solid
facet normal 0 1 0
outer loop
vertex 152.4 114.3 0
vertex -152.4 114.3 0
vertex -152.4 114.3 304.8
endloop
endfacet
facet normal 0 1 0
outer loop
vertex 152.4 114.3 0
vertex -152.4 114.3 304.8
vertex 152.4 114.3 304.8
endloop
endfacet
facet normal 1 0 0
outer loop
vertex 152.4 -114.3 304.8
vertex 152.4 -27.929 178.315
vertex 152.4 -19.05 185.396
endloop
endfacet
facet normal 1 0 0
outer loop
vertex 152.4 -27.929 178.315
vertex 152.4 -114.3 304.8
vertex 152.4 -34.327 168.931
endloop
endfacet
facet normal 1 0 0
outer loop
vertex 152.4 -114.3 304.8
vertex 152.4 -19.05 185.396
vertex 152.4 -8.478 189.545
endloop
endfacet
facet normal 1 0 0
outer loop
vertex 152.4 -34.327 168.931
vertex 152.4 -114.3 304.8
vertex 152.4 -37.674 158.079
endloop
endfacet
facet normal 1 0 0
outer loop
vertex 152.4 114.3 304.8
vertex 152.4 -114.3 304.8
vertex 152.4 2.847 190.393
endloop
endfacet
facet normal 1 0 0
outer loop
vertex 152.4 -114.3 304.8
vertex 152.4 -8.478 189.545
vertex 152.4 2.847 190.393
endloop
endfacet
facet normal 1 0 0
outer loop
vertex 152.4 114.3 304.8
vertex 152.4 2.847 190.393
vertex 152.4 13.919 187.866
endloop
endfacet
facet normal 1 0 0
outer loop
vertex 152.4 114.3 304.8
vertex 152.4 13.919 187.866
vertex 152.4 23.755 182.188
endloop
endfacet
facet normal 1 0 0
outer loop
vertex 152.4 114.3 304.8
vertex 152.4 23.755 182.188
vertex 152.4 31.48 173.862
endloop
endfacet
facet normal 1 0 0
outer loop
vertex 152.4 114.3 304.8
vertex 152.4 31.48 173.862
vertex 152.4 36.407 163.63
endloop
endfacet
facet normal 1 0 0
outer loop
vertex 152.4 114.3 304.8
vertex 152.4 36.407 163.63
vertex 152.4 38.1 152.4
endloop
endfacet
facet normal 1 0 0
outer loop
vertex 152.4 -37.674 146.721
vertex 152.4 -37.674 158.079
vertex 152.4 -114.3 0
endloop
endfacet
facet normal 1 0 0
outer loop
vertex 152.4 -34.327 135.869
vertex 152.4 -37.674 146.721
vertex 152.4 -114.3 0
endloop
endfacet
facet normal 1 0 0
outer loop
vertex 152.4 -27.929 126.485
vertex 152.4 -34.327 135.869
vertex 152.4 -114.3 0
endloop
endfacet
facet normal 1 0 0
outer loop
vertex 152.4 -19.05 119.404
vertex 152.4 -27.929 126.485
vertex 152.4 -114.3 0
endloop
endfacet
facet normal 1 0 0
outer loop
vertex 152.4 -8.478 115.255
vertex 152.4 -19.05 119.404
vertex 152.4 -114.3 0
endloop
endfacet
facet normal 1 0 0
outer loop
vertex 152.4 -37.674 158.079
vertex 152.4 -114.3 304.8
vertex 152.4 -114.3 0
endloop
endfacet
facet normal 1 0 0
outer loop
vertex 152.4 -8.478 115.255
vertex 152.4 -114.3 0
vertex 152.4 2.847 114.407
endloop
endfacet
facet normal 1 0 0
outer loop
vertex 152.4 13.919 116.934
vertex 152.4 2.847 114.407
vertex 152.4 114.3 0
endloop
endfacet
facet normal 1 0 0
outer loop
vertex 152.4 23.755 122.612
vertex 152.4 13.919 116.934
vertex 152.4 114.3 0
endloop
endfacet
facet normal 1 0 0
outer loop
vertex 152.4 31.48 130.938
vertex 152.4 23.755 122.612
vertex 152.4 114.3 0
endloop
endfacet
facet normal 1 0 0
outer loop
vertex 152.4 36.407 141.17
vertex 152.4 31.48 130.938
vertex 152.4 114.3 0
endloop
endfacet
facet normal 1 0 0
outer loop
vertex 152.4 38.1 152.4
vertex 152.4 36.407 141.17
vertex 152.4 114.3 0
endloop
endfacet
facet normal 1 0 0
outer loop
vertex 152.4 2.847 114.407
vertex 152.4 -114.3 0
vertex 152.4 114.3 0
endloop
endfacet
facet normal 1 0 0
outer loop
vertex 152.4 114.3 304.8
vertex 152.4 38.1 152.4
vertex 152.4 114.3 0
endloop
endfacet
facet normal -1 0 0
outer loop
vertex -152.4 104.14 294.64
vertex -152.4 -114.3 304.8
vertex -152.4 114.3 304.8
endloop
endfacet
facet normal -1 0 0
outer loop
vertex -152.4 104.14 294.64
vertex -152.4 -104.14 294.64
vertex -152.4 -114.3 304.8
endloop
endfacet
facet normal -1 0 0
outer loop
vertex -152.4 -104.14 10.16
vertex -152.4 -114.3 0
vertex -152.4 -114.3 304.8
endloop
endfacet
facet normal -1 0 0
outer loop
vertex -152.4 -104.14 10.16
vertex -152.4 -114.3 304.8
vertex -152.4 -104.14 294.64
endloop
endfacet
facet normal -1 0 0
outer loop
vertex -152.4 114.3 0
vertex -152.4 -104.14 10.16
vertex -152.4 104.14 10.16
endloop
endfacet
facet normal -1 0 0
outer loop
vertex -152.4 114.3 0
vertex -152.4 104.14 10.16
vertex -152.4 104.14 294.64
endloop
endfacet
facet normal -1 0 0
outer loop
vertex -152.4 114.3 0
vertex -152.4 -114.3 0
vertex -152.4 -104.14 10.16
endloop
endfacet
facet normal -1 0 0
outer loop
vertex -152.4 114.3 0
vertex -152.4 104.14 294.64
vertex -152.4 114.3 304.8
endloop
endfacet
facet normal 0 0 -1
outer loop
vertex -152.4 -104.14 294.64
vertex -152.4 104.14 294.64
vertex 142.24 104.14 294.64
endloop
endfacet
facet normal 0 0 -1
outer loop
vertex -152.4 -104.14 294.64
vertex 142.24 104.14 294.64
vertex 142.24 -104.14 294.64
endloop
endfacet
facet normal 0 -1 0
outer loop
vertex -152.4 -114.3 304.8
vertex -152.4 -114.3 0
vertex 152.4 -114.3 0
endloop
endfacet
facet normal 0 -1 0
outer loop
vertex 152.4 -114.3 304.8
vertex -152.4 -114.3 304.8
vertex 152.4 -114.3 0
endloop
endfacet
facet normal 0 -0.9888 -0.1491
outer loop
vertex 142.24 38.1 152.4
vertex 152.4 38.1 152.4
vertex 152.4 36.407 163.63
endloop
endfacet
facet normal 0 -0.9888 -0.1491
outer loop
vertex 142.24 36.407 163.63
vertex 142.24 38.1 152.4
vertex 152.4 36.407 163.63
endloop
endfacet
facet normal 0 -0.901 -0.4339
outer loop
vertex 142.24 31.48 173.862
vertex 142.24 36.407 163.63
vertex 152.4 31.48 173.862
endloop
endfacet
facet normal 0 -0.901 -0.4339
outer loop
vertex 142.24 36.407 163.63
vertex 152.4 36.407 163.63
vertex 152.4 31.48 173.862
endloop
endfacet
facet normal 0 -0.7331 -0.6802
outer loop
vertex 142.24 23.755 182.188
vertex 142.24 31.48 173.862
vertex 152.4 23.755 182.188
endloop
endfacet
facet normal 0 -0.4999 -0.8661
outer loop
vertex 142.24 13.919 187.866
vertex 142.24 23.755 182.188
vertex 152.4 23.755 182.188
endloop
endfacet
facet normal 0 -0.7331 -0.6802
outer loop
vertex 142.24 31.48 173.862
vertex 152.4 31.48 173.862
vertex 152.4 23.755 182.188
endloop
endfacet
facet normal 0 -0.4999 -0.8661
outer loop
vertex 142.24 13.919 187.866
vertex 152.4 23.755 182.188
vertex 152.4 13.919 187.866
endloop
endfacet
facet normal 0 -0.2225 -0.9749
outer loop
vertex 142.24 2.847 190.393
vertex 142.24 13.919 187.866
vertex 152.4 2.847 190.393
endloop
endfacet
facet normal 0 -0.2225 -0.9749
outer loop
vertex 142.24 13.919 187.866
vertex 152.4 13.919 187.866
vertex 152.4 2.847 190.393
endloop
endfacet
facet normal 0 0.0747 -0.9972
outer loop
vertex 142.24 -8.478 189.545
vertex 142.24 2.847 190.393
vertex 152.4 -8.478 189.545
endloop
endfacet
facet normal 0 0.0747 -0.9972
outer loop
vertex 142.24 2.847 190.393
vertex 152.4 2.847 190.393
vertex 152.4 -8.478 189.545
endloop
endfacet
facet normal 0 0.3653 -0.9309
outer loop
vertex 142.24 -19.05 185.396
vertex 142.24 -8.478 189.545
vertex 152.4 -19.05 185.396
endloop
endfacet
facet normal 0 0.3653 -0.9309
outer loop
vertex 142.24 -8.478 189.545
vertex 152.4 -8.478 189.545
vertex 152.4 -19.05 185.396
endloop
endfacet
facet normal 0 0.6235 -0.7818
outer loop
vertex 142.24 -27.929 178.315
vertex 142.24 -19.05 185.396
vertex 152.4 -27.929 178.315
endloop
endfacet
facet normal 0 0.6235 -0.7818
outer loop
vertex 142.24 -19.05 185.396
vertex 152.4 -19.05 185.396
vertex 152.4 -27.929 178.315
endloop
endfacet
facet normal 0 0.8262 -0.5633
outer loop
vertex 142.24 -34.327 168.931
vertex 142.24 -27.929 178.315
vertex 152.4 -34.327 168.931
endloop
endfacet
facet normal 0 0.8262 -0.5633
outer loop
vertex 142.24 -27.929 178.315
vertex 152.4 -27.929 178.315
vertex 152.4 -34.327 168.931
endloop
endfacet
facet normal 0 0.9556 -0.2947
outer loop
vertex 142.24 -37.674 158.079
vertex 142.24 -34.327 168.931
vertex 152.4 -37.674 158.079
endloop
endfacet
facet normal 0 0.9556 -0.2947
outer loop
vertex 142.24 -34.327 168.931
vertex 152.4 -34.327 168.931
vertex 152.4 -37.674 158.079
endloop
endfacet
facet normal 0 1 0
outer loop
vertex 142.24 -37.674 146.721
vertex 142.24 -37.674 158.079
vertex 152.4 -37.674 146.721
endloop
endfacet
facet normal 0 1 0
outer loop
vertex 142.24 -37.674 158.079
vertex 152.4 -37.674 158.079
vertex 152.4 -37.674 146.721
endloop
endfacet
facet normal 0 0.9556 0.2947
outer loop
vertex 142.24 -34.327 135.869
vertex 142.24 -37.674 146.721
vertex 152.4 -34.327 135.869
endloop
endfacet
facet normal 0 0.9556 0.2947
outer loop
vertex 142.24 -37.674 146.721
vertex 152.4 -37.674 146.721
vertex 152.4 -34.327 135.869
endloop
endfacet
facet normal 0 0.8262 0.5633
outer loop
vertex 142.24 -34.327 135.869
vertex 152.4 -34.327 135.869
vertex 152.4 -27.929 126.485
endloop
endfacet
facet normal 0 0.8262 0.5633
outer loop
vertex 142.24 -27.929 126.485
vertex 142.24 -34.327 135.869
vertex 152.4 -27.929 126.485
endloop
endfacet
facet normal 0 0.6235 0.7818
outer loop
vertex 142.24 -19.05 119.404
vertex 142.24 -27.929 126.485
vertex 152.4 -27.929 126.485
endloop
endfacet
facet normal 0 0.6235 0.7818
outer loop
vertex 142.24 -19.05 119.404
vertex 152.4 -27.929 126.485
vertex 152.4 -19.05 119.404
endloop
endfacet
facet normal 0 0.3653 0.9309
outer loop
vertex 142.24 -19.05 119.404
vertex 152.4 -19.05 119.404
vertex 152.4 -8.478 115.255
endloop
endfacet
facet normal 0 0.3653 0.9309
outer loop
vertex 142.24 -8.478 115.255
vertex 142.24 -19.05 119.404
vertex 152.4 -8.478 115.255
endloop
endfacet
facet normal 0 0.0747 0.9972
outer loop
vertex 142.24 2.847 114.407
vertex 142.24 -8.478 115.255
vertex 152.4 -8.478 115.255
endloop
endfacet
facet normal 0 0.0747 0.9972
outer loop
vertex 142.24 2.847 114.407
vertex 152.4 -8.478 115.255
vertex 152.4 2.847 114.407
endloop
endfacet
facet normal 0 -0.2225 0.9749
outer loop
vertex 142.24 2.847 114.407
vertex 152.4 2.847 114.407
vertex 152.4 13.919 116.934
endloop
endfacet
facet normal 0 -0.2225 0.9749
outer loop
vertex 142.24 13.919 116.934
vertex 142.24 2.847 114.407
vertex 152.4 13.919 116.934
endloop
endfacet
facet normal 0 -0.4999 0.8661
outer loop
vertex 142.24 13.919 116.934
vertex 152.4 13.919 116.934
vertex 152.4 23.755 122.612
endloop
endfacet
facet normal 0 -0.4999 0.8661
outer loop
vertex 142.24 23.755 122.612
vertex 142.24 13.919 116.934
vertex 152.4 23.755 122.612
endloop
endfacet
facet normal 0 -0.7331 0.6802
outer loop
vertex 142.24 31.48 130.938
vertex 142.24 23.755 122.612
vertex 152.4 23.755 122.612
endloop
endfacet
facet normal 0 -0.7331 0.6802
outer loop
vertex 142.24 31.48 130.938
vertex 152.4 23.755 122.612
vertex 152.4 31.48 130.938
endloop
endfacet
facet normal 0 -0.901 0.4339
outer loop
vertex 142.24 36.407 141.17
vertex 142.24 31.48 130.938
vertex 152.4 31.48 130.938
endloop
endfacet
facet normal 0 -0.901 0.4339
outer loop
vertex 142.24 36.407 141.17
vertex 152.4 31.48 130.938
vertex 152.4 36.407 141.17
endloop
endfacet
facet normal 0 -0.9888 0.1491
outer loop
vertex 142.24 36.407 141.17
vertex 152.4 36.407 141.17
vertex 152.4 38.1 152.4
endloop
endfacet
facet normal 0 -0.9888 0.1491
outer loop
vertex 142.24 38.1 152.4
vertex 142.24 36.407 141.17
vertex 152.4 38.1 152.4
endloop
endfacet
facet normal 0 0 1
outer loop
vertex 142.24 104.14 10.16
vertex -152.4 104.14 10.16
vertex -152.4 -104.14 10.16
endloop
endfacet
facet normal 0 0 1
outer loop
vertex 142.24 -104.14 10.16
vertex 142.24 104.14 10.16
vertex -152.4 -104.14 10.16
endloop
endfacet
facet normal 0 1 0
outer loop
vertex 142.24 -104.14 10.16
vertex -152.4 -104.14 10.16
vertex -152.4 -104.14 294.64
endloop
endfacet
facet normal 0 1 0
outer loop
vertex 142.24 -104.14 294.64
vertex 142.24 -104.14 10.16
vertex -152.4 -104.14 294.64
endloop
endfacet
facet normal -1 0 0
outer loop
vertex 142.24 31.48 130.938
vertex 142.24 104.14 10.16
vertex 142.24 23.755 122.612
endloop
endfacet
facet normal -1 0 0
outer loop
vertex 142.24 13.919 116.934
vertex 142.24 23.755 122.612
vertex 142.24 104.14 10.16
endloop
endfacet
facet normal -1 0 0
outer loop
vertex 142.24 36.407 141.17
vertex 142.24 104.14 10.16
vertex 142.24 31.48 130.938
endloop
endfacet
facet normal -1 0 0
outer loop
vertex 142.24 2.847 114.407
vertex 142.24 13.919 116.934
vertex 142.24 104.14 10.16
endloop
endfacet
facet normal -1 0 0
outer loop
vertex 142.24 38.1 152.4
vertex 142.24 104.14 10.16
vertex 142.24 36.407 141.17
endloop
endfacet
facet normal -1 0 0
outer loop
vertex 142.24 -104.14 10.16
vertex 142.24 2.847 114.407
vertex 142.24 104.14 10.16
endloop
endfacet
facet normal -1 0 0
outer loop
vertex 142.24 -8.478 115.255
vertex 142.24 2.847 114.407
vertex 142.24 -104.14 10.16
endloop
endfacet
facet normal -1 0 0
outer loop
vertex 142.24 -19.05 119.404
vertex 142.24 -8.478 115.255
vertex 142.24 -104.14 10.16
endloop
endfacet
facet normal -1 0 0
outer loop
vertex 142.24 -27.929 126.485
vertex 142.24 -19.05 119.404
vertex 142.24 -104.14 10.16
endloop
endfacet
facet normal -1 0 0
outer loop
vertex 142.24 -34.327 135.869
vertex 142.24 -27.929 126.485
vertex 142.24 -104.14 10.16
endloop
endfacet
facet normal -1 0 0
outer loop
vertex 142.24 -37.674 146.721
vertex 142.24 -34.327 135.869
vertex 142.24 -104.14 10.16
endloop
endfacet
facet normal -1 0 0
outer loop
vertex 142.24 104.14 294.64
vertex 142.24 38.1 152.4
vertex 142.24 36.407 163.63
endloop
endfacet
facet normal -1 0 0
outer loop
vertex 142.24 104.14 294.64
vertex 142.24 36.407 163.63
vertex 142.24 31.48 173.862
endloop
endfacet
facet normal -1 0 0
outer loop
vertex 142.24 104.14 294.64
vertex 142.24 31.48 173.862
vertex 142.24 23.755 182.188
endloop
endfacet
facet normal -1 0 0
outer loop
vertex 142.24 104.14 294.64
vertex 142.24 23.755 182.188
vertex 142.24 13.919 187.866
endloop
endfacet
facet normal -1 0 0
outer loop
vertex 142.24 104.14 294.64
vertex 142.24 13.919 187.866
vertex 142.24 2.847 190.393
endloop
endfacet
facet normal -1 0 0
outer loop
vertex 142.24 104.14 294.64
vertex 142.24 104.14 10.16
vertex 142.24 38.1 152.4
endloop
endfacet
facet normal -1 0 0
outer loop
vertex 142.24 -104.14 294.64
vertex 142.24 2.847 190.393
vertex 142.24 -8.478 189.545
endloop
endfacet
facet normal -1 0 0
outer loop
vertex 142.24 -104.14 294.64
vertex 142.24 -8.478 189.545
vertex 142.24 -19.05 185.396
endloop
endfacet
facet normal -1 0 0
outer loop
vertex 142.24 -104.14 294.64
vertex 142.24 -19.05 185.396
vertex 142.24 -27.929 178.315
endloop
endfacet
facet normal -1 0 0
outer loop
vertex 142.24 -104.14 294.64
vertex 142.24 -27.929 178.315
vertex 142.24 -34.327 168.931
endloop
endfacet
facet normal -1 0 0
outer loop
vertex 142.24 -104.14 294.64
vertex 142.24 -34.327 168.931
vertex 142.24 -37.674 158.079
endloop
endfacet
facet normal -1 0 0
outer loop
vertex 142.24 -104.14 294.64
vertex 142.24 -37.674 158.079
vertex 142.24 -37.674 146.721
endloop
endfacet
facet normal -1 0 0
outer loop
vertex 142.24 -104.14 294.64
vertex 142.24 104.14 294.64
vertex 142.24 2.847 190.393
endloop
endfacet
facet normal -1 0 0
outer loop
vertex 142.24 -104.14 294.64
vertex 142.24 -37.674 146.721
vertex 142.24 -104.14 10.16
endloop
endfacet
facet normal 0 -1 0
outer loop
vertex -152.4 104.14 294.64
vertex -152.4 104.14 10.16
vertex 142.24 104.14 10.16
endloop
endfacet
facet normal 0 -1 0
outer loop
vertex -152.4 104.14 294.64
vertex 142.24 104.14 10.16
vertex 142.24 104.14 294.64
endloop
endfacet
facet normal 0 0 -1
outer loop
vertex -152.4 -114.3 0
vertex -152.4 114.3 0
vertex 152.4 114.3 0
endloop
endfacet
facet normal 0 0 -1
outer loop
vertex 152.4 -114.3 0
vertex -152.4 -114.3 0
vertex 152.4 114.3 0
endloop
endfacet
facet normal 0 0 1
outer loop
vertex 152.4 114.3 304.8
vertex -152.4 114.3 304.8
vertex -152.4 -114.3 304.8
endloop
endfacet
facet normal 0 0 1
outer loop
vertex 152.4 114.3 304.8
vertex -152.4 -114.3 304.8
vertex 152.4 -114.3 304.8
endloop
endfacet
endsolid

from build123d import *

# Parameters (mm, degrees)
F0_W     = 304.8
F0_H     = 228.6
F1_DEPTH = 304.8
F2_W     = 208.28
F2_H     = 284.48
F3_DEPTH = 294.64
F4_R     = 38.1
F5_DEPTH = 25.4


with BuildPart() as f1:
    # F0 (on Top) → F1 (new body)
    with BuildSketch(Plane.XY):
        Rectangle(F0_W, F0_H)
    extrude(amount=F1_DEPTH)

    # F2 (on face) → F3 (cut)
    with BuildSketch(Plane(origin=(-152.4, 0, 0), x_dir=(0, -1, 0), z_dir=(-1, 0, 0))):
        with Locations((0, 152.4)):
            Rectangle(F2_W, F2_H)
    extrude(amount=-F3_DEPTH, mode=Mode.SUBTRACT)

    # F4 (on face) → F5 (cut)
    with BuildSketch(Plane.YZ.offset(152.4)):
        with Locations((0, 152.4)):
            Circle(F4_R)
    extrude(amount=-F5_DEPTH, mode=Mode.SUBTRACT)


solid = f1.part
